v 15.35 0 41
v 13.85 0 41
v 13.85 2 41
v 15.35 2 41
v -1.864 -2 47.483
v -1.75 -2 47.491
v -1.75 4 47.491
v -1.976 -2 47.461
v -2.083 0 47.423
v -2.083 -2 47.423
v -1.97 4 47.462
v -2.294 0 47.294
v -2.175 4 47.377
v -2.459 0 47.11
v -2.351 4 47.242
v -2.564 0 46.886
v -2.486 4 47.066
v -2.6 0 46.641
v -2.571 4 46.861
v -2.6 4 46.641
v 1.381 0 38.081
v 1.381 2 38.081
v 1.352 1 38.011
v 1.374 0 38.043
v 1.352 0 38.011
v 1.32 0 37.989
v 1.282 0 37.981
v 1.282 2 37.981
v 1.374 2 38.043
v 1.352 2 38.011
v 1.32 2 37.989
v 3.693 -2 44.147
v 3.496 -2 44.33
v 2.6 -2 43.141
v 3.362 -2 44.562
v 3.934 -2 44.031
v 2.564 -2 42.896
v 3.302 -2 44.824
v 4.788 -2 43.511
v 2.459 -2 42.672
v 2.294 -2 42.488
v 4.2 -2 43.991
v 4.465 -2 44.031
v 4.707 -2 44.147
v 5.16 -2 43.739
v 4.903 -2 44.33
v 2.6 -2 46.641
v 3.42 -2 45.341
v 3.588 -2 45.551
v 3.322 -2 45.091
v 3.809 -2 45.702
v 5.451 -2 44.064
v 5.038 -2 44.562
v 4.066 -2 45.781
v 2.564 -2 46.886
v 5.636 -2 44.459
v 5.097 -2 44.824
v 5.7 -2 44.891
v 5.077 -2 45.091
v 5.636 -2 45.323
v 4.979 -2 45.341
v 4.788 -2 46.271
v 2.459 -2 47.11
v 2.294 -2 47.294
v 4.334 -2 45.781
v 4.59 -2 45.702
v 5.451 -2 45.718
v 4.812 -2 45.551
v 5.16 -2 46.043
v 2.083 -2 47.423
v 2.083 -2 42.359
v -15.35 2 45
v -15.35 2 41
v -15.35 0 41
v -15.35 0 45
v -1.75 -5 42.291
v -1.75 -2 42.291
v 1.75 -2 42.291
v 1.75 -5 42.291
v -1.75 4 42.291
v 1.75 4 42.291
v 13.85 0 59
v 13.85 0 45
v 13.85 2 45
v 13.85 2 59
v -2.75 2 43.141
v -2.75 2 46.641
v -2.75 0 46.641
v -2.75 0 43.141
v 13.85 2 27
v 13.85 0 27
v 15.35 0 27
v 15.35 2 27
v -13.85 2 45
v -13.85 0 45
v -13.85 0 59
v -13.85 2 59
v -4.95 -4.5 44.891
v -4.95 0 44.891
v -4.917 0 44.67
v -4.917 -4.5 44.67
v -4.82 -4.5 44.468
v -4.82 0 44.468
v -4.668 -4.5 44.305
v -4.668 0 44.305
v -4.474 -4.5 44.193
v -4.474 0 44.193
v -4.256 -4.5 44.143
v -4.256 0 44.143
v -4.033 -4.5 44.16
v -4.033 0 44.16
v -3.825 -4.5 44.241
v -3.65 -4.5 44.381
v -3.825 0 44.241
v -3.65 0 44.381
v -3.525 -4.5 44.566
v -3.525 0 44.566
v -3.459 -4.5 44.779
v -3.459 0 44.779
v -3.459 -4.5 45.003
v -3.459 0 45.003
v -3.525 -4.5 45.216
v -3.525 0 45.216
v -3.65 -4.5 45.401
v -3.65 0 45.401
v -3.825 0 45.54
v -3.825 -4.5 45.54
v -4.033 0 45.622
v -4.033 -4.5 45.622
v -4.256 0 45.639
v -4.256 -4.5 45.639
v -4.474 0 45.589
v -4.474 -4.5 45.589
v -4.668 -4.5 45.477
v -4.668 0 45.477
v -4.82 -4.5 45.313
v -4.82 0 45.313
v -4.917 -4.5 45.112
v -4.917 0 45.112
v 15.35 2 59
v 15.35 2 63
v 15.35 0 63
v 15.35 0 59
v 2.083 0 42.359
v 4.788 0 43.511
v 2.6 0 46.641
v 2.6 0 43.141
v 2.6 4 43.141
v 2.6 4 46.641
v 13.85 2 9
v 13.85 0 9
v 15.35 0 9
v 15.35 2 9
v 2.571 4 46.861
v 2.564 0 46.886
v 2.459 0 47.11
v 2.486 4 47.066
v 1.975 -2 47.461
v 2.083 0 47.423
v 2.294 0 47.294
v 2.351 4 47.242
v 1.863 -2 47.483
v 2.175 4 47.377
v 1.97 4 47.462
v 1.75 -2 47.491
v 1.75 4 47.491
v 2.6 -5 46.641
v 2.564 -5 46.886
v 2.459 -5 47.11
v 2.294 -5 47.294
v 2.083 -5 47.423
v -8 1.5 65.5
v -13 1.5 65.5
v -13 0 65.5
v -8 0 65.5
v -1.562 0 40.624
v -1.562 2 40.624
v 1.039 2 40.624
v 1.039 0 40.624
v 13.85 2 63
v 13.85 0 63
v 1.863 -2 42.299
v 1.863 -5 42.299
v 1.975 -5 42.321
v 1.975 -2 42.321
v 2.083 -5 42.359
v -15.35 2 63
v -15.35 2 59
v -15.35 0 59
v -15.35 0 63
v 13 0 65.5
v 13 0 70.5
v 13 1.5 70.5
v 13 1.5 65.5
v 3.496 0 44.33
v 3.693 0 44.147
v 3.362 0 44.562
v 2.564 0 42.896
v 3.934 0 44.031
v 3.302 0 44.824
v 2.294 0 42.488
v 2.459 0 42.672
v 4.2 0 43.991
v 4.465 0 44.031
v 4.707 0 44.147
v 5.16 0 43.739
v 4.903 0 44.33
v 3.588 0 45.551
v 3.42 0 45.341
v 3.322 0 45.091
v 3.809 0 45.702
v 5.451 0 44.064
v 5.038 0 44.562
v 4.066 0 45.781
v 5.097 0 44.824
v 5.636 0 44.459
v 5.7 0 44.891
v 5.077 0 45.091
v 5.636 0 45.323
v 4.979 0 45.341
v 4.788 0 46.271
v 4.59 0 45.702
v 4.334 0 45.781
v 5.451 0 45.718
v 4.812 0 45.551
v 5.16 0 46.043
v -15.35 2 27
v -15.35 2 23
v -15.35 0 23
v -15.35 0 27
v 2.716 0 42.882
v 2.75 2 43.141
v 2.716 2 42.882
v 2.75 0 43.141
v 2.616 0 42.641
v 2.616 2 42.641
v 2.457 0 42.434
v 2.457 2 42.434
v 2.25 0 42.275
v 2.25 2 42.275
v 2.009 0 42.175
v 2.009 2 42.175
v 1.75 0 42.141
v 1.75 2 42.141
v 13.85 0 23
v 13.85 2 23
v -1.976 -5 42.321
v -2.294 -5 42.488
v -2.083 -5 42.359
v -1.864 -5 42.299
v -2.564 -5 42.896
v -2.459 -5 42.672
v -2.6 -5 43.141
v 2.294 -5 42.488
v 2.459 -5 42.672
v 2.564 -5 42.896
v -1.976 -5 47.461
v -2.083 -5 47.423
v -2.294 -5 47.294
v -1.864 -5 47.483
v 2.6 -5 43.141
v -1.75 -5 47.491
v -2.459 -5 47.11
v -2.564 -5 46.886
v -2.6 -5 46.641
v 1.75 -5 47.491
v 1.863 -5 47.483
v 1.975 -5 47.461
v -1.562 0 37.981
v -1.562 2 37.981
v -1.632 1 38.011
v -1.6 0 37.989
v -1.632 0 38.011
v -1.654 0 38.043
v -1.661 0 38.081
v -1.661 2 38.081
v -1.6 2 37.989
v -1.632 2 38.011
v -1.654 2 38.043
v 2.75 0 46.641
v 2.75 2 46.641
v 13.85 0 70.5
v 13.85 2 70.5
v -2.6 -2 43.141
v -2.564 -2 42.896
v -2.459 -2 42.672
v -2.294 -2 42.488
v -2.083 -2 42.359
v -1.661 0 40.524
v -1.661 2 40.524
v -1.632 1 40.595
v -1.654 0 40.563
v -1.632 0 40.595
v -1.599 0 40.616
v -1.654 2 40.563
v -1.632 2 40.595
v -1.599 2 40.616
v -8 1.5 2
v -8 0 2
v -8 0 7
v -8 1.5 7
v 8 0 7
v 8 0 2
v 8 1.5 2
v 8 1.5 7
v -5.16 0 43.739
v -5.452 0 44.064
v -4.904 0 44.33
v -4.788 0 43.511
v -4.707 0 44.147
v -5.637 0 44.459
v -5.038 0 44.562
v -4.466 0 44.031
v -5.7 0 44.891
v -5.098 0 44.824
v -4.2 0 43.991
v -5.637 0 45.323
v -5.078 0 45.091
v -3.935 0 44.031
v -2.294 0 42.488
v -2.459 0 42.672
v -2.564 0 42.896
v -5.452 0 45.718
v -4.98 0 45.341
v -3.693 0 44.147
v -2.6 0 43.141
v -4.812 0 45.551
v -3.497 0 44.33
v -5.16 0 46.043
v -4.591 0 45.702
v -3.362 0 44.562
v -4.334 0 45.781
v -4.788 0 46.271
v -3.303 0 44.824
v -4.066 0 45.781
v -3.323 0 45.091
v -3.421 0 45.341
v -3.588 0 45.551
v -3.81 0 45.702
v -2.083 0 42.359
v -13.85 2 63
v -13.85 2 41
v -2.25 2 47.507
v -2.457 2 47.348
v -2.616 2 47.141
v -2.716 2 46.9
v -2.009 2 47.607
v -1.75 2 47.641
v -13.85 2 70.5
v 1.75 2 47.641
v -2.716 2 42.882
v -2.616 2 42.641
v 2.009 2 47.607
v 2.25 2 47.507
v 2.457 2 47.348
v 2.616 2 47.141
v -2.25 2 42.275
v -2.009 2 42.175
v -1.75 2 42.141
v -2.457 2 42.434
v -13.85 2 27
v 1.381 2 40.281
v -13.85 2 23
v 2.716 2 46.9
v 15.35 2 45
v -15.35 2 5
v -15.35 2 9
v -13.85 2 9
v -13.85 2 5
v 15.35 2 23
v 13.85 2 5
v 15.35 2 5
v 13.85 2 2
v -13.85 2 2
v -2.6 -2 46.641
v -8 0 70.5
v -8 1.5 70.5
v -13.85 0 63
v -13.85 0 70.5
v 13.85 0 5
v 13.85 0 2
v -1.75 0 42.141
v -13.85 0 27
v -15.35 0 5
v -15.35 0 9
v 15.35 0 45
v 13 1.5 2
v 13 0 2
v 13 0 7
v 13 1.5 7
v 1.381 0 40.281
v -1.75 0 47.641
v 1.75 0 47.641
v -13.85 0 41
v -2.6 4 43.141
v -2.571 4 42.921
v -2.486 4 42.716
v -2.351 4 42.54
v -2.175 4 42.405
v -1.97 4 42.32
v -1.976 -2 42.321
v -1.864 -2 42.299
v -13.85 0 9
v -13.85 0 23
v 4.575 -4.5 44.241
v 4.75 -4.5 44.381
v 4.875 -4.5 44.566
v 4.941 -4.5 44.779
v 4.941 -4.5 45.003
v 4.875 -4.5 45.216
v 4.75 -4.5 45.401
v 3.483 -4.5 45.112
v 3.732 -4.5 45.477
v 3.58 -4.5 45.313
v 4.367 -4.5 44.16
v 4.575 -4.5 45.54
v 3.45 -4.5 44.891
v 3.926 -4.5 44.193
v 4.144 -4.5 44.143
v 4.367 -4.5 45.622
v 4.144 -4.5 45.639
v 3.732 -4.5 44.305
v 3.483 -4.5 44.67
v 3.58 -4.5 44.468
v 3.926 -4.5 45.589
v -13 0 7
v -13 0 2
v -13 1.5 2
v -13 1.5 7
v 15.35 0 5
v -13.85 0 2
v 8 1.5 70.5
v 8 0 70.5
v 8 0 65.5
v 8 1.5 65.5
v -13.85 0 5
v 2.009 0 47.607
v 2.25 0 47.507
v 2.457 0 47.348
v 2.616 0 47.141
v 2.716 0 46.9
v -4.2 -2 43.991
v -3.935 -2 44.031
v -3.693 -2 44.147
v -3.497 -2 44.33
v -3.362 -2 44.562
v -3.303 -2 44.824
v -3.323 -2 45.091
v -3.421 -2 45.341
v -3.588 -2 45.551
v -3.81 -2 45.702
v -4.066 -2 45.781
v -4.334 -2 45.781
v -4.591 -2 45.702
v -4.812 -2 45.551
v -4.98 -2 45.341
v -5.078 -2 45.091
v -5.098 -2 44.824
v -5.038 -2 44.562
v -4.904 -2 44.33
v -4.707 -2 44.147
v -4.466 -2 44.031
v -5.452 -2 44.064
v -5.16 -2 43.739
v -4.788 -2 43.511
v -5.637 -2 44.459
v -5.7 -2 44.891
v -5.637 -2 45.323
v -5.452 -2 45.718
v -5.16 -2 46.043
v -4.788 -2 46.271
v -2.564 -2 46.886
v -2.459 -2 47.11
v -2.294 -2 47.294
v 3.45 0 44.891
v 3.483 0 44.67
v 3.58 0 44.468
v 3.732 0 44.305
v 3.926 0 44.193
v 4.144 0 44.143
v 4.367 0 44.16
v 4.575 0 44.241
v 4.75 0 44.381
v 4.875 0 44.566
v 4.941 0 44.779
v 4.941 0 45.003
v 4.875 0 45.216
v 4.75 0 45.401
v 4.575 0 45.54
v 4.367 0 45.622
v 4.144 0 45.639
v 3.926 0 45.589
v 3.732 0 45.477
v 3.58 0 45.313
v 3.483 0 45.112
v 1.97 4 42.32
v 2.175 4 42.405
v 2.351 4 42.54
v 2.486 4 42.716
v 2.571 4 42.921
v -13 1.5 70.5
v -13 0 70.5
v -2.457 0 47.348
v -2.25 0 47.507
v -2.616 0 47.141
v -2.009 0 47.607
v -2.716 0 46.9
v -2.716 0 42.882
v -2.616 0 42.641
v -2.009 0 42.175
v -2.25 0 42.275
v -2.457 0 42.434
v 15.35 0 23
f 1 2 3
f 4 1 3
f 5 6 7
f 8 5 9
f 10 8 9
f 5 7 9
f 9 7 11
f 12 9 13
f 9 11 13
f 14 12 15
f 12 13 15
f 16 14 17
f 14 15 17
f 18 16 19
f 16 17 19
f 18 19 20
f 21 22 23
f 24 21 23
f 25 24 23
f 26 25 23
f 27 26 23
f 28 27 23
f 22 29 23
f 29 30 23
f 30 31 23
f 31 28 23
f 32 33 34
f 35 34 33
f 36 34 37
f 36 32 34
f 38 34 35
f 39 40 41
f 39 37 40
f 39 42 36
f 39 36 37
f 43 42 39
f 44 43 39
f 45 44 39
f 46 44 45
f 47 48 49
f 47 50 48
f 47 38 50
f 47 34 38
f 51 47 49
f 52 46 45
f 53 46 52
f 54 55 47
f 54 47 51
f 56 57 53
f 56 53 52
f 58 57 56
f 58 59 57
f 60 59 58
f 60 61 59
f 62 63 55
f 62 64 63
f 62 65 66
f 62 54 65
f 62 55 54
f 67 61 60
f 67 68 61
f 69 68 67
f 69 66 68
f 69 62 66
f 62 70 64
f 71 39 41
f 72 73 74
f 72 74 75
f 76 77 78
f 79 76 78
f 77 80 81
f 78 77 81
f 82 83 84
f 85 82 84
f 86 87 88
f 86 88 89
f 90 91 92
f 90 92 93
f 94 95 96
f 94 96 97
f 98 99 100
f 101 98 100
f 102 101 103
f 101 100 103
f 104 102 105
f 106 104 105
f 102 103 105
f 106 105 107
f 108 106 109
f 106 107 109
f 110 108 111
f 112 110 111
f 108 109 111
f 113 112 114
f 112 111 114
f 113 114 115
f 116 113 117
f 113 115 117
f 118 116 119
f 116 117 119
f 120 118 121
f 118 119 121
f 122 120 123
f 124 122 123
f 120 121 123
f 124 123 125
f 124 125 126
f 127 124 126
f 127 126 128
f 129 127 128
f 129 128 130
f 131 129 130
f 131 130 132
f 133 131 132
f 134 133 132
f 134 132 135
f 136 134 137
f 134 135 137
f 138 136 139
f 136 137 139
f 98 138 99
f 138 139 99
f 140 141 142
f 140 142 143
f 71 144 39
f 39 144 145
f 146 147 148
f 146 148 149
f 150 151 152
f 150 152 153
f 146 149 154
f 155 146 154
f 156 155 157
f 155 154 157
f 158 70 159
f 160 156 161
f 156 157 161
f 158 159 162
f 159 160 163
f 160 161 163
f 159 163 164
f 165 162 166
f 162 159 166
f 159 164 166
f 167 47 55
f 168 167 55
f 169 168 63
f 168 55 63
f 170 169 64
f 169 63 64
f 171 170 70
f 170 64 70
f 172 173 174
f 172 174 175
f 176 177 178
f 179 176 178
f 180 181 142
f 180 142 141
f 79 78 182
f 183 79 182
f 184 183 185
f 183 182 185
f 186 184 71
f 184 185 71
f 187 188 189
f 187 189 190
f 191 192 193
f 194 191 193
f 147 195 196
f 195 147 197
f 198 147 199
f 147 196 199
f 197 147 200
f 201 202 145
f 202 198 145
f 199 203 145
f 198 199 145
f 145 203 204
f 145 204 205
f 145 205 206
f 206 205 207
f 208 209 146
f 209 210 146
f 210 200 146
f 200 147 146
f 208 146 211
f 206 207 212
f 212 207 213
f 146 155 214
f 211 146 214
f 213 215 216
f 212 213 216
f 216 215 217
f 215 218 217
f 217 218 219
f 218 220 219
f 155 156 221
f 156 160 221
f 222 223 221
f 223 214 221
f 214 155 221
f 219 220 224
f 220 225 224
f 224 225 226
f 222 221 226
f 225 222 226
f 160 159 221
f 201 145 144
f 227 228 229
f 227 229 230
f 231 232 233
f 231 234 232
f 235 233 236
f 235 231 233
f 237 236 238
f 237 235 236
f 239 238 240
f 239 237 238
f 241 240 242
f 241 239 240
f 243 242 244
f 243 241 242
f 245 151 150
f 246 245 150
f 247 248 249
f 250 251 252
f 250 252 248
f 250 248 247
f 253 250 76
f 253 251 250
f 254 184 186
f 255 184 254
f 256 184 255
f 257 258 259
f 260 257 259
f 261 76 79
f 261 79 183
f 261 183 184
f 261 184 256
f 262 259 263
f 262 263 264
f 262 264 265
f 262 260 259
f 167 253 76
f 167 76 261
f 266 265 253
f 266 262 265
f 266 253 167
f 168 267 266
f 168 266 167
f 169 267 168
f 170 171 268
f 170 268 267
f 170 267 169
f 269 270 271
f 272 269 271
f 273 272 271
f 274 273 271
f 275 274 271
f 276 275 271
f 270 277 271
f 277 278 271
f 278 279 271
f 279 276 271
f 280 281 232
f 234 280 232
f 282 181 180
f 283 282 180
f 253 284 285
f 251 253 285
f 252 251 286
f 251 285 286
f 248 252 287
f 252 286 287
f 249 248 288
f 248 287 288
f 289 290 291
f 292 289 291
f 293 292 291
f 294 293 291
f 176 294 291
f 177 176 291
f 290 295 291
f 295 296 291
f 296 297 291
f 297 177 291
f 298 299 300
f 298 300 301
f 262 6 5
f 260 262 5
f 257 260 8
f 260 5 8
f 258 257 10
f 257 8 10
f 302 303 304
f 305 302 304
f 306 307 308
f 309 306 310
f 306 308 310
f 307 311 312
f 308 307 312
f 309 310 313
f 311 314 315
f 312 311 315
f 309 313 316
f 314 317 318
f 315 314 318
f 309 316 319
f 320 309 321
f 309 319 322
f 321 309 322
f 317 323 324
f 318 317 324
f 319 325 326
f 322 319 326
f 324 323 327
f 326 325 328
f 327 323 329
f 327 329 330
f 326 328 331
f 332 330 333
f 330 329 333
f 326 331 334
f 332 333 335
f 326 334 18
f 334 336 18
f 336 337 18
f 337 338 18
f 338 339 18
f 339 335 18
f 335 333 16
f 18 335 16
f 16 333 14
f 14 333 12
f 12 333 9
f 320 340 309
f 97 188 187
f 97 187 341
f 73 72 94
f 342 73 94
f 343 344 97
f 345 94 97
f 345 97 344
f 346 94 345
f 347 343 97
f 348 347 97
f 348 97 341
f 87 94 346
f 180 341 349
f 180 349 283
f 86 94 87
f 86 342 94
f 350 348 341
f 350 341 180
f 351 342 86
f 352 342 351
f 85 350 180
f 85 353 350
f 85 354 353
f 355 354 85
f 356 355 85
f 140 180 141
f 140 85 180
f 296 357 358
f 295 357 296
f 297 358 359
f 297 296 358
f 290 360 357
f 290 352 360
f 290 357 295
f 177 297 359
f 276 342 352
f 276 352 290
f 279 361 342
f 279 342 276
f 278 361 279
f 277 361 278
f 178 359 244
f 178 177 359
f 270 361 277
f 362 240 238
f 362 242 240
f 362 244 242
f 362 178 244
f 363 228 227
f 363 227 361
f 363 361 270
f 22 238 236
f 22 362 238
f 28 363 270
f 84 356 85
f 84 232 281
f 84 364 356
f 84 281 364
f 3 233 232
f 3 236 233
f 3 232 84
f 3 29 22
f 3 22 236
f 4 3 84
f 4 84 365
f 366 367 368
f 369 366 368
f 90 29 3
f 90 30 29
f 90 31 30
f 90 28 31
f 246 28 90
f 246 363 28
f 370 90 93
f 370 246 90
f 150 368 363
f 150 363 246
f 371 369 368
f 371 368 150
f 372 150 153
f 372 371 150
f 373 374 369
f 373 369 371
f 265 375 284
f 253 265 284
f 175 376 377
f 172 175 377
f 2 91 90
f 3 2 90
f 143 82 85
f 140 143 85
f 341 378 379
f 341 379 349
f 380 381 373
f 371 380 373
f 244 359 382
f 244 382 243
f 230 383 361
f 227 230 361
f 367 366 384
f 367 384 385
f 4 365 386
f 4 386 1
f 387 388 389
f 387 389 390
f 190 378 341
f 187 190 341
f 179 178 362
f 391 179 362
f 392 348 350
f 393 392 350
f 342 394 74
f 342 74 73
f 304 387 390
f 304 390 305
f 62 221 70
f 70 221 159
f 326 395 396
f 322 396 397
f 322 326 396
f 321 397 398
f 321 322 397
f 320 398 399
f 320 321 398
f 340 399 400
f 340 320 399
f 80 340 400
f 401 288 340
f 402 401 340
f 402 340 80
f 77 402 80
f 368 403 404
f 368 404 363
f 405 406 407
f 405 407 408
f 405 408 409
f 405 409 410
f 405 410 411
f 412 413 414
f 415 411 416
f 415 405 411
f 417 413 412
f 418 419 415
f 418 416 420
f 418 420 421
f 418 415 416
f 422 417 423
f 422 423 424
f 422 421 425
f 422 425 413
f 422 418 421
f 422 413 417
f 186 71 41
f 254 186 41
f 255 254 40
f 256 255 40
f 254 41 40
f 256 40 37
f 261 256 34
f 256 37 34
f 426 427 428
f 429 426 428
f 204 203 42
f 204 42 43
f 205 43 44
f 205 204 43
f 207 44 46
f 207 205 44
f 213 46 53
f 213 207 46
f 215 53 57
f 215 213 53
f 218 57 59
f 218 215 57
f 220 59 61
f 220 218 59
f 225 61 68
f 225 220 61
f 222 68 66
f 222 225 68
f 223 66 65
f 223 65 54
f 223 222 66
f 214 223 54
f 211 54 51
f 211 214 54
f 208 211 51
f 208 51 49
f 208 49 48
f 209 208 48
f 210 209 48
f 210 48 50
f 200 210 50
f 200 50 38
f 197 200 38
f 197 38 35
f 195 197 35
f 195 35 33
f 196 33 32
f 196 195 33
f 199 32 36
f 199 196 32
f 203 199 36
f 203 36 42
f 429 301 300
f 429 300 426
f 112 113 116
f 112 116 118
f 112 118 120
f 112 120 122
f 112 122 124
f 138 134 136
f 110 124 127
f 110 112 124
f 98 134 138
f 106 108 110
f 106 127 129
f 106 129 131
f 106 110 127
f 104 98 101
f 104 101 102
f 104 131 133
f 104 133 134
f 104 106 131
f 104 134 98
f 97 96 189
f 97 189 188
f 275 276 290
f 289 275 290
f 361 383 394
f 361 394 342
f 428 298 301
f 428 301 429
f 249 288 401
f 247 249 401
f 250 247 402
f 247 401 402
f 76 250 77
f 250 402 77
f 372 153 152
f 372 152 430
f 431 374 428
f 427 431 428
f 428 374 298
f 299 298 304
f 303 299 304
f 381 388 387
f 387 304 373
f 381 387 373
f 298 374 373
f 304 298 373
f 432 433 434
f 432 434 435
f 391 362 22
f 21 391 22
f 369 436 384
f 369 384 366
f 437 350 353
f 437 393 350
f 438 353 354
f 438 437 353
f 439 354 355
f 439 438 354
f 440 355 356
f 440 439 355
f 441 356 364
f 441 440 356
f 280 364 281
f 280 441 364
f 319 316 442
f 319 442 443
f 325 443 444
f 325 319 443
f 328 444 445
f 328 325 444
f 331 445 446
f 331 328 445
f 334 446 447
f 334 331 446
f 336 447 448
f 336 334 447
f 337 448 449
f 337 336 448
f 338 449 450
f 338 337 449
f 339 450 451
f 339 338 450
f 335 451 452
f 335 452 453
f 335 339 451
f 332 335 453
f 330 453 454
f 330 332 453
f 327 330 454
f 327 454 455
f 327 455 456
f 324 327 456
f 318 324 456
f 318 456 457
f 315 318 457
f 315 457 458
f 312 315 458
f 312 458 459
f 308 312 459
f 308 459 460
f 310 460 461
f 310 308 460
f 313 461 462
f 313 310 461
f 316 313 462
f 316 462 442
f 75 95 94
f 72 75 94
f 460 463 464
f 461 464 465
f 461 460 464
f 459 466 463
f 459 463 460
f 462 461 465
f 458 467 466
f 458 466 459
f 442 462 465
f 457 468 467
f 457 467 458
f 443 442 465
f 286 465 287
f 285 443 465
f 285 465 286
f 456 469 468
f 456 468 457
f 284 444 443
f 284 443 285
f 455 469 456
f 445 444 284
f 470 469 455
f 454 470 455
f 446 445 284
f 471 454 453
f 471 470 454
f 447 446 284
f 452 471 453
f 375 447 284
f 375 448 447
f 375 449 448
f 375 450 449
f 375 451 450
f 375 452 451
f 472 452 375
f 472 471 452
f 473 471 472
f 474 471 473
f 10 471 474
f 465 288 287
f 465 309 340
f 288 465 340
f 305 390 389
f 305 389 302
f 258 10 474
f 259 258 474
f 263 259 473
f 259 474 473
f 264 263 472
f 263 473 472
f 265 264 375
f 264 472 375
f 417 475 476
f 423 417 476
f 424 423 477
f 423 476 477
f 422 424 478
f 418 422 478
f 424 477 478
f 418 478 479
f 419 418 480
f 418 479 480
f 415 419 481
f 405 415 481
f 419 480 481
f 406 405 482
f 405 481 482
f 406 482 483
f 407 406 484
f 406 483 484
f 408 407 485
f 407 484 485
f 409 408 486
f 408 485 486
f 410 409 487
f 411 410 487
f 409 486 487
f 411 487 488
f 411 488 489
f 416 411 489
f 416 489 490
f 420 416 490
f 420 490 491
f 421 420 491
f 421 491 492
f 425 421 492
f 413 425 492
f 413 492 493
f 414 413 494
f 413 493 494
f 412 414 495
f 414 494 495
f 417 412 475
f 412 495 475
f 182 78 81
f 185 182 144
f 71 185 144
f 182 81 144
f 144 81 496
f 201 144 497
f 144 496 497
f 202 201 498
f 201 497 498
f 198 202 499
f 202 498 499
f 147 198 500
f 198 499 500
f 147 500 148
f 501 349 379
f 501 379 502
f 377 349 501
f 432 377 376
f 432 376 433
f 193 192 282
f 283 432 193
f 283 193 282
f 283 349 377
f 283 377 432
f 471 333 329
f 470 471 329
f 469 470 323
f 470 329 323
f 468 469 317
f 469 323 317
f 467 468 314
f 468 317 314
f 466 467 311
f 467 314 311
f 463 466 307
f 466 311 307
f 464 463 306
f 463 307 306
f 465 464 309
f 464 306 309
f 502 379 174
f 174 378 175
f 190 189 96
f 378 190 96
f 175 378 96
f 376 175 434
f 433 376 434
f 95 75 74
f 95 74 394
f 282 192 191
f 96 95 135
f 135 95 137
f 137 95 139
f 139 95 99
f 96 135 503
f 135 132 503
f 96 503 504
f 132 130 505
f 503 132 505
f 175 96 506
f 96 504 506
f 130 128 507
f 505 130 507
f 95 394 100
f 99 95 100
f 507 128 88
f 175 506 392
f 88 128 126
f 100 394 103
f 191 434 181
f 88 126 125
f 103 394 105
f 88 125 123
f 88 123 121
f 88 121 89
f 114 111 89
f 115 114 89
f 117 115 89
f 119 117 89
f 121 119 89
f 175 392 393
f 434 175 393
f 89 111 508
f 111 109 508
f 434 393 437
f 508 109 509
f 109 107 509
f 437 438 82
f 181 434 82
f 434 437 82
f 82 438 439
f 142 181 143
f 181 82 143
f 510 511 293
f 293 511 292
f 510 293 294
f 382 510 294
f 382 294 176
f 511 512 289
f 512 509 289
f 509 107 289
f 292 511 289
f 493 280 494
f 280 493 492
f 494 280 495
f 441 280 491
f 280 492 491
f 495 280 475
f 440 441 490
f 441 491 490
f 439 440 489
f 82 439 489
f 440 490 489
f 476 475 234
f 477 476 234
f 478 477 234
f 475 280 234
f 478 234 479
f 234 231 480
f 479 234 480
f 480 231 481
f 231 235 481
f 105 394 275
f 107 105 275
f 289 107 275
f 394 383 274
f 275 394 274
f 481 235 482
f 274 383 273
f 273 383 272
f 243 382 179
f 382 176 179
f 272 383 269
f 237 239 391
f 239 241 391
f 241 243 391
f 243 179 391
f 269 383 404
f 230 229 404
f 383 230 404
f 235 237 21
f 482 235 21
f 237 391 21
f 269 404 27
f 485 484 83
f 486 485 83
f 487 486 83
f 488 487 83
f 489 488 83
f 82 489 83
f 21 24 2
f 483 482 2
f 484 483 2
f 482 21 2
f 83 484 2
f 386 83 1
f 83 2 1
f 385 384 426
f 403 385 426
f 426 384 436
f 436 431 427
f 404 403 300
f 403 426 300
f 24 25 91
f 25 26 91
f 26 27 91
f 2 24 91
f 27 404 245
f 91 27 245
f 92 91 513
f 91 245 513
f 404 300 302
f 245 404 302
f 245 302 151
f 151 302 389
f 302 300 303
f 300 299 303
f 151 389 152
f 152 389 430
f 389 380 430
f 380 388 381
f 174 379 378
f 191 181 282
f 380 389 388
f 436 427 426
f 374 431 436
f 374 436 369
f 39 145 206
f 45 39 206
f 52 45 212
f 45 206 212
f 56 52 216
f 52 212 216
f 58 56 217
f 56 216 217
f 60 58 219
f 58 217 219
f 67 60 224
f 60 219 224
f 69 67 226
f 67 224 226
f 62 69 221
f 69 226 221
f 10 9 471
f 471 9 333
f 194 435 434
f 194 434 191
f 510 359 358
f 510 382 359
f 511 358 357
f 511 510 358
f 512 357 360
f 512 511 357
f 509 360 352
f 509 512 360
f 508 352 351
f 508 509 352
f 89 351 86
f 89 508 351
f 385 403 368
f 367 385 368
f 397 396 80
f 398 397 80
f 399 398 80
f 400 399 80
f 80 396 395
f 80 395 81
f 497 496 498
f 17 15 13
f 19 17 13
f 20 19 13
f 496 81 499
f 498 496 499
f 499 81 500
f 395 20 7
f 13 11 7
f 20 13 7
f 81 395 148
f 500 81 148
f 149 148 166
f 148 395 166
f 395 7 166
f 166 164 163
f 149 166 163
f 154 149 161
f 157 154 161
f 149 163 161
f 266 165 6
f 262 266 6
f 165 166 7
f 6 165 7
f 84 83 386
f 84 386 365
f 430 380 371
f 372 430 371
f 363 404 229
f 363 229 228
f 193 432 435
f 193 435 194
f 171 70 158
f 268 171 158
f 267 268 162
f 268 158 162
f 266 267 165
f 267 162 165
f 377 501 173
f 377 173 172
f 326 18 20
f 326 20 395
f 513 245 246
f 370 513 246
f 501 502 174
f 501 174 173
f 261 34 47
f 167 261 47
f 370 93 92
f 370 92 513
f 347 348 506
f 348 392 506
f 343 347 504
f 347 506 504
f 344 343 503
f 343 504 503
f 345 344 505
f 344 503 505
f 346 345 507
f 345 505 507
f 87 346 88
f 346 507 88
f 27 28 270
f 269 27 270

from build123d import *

# Parameters (mm, degrees)
SKETCH_1_W          = 27.7
SKETCH_1_H          = 2
EXTRUDE_1_DEPTH     = 70.5
SKETCH_16_W         = 5
SKETCH_16_H         = 1.5
CUT_EXTRUDE_6_DEPTH = 5
SKETCH_4_W          = 5.5
SKETCH_4_H          = 5.5
CUT_EXTRUDE_2_DEPTH = 72.875395651
FILLET_1_R          = 1
EXTRUDE_3_DEPTH     = 4
SKETCH_6_R          = 0.9
EXTRUDE_4_DEPTH     = 2
SKETCH_7_R          = 0.75
EXTRUDE_5_DEPTH     = 4.5
EXTRUDE_START       = 2
EXTRUDE_6_DEPTH     = 3
CUT_EXTRUDE_7_DEPTH = 2
SKETCH_18_W         = 27.7
SKETCH_18_H         = 2
CUT_EXTRUDE_8_DEPTH = 73.187758774
SKETCH_19_W         = 4
SKETCH_19_H         = 2
EXTRUDE_7_DEPTH     = 1.5
SKETCH_20_W         = 4
SKETCH_20_H         = 2
EXTRUDE_9_DEPTH     = 1.5
SKETCH_21_W         = 5
SKETCH_21_H         = 1.5
CUT_EXTRUDE_9_DEPTH = 5


with BuildPart() as part:
    # 草图1 → 凸台-拉伸1 (new body)
    with BuildSketch(Plane.XY):
        with Locations((0, 1)):
            Rectangle(SKETCH_1_W, SKETCH_1_H)
    extrude(amount=EXTRUDE_1_DEPTH)

    # 草图16 → 切除-拉伸6 (cut)
    with BuildSketch(Plane.XY.offset(70.5)):
        with Locations((-10.5, 0.75)):
            Rectangle(SKETCH_16_W, SKETCH_16_H)
        with Locations((10.5, 0.75)):
            Rectangle(SKETCH_16_W, SKETCH_16_H)
    extrude(amount=-CUT_EXTRUDE_6_DEPTH, mode=Mode.SUBTRACT)

    # 草图4 → 切除-拉伸2 (cut, through all)
    with BuildSketch(Plane(origin=(0, 2, 0), x_dir=(1, 0, 0), z_dir=(0, 1, 0))):
        with Locations((-0.000254001, -44.890957582)):
            Rectangle(SKETCH_4_W, SKETCH_4_H)
    extrude(amount=-CUT_EXTRUDE_2_DEPTH, mode=Mode.SUBTRACT)

    # 圆角1
    fillet_1_edges = [part.edges().sort_by_distance(p)[0] for p in [
        (2.749745999, 1, 42.140957582),
        (2.749745999, 1, 47.640957582),
        (-2.750254001, 1, 47.640957582),
        (-2.750254001, 1, 42.140957582),
    ]]
    fillet(fillet_1_edges, radius=FILLET_1_R)

    # 草图7 → 凸台-拉伸5 (add)
    with BuildSketch(Plane.XZ):
        with Locations(Location((4.199745999, 44.890957582, 0), (0, 0, 180))):
            Circle(SKETCH_7_R)
        with Locations(Location((-4.200254001, 44.890957582, 0), (0, 0, 180))):
            Circle(SKETCH_7_R)
    extrude(amount=EXTRUDE_5_DEPTH)

    # 草图17 → 切除-拉伸7 (cut)
    with BuildSketch(Plane(origin=(0, 2, 0), x_dir=(1, 0, 0), z_dir=(0, 1, 0))):
        with BuildLine():
            Line((1.381293223, -40.281381402), (1.381293223, -38.081000872))
            add(Edge.make_bspline(
                [(1.381293223, -38.081000872), (1.381293223, -37.981381402), (1.281673753, -37.981381402)],
                knots=[5.501585242, 5.501585242, 5.501585242, 7.064785372, 7.064785372, 7.064785372], degree=2, weights=[1, 0.709787336, 1]))
            Line((1.281673753, -37.981381402), (-1.561607713, -37.981381402))
            add(Edge.make_bspline(
                [(-1.561607713, -37.981381402), (-1.661227183, -37.981381402), (-1.661227183, -38.081000872)],
                knots=[5.501585242, 5.501585242, 5.501585242, 7.064785372, 7.064785372, 7.064785372], degree=2, weights=[1, 0.709787336, 1]))
            Line((-1.661227183, -38.081000872), (-1.661227183, -40.524282338))
            add(Edge.make_bspline(
                [(-1.661227183, -40.524282338), (-1.661227183, -40.623901808), (-1.561607713, -40.623901808)],
                knots=[5.501585242, 5.501585242, 5.501585242, 7.064785372, 7.064785372, 7.064785372], degree=2, weights=[1, 0.709787336, 1]))
            Line((-1.561607713, -40.623901808), (1.038772817, -40.623901808))
            Line((1.038772817, -40.623901808), (1.381293223, -40.281381402))
        make_face()
    extrude(amount=-CUT_EXTRUDE_7_DEPTH, mode=Mode.SUBTRACT)

    # 草图18 → 切除-拉伸8 (cut, through all)
    with BuildSketch(Plane(origin=(0, 2, 0), x_dir=(1, 0, 0), z_dir=(0, 1, 0))):
        with Locations((0, -1)):
            Rectangle(SKETCH_18_W, SKETCH_18_H)
    extrude(amount=-CUT_EXTRUDE_8_DEPTH, mode=Mode.SUBTRACT)

    # 草图19 → 凸台-拉伸7 (add)
    with BuildSketch(Plane.ZY.offset(13.85)):
        with Locations((7, 1)):
            Rectangle(SKETCH_19_W, SKETCH_19_H)
        with Locations((43, 1)):
            Rectangle(SKETCH_19_W, SKETCH_19_H)
        with Locations((25, 1)):
            Rectangle(SKETCH_19_W, SKETCH_19_H)
        with Locations((61, 1)):
            Rectangle(SKETCH_19_W, SKETCH_19_H)
    extrude(amount=EXTRUDE_7_DEPTH)

    # 草图20 → 凸台-拉伸9 (add)
    with BuildSketch(Plane(origin=(13.85, 0, 0), x_dir=(0, 0, -1), z_dir=(1, 0, 0))):
        with Locations((-61, 1)):
            Rectangle(SKETCH_20_W, SKETCH_20_H)
        with Locations((-43, 1)):
            Rectangle(SKETCH_20_W, SKETCH_20_H)
        with Locations((-25, 1)):
            Rectangle(SKETCH_20_W, SKETCH_20_H)
        with Locations((-7, 1)):
            Rectangle(SKETCH_20_W, SKETCH_20_H)
    extrude(amount=EXTRUDE_9_DEPTH)

    # 草图21 → 切除-拉伸9 (cut)
    with BuildSketch(Plane(origin=(0, 0, 2), x_dir=(-1, 0, 0), z_dir=(0, 0, -1))):
        with Locations((-10.5, 0.75)):
            Rectangle(SKETCH_21_W, SKETCH_21_H)
        with Locations((10.5, 0.75)):
            Rectangle(SKETCH_21_W, SKETCH_21_H)
    extrude(amount=-CUT_EXTRUDE_9_DEPTH, mode=Mode.SUBTRACT)


with BuildPart() as body_2:
    # 草图5 → 凸台-拉伸3 (new body)
    with BuildSketch(Plane.XZ):
        with BuildLine():
            Line((-2.600254001, 46.640957582), (-2.600254001, 43.140957582))
            ThreePointArc((-2.600254001, 43.140957582), (-2.351294765, 42.539916818), (-1.750254001, 42.290957582))
            Line((-1.750254001, 42.290957582), (1.749745999, 42.290957582))
            ThreePointArc((1.749745999, 42.290957582), (2.350786764, 42.539916818), (2.599745999, 43.140957582))
            Line((2.599745999, 43.140957582), (2.599745999, 46.640957582))
            ThreePointArc((2.599745999, 46.640957582), (2.350786764, 47.241998346), (1.749745999, 47.490957582))
            Line((1.749745999, 47.490957582), (-1.750254001, 47.490957582))
            ThreePointArc((-1.750254001, 47.490957582), (-2.351294765, 47.241998346), (-2.600254001, 46.640957582))
        make_face()
    extrude(amount=-EXTRUDE_3_DEPTH)

    # 草图6 → 凸台-拉伸4 (add)
    # profile 1 of 3: a face of its own
    with BuildSketch(Plane.XZ):
        with BuildLine():
            ThreePointArc((-2.600254001, 46.640957582), (-2.459343486, 47.109670821), (-2.08333141, 47.422980241))
            Line((-2.08333141, 47.422980241), (-4.788037664, 46.270997568))
            ThreePointArc((-4.788037664, 46.270997568), (-5.700254001, 44.890957582), (-4.788037664, 43.510917595))
            Line((-4.788037664, 43.510917595), (-2.08333141, 42.358934923))
            ThreePointArc((-2.08333141, 42.358934923), (-2.459343486, 42.672244342), (-2.600254001, 43.140957582))
            Line((-2.600254001, 43.140957582), (-2.600254001, 46.640957582))
        make_face()
        with Locations(Location((-4.200254001, 44.890957582, 0), (0, 0, 270))):
            Circle(SKETCH_6_R, mode=Mode.SUBTRACT)
    # profile 2 of 3: a face of its own
    with BuildSketch(Plane.XZ):
        with BuildLine():
            Line((1.749745999, 47.490957582), (-1.750254001, 47.490957582))
            ThreePointArc((-1.750254001, 47.490957582), (-2.351294765, 47.241998346), (-2.600254001, 46.640957582))
            Line((-2.600254001, 46.640957582), (-2.600254001, 43.140957582))
            ThreePointArc((-2.600254001, 43.140957582), (-2.351294765, 42.539916818), (-1.750254001, 42.290957582))
            Line((-1.750254001, 42.290957582), (1.749745999, 42.290957582))
            ThreePointArc((1.749745999, 42.290957582), (2.350786764, 42.539916818), (2.599745999, 43.140957582))
            Line((2.599745999, 43.140957582), (2.599745999, 46.640957582))
            ThreePointArc((2.599745999, 46.640957582), (2.350786764, 47.241998346), (1.749745999, 47.490957582))
        make_face()
    # profile 3 of 3: a face of its own
    with BuildSketch(Plane.XZ):
        with BuildLine():
            Line((4.787529663, 46.270997568), (2.082823409, 47.422980241))
            ThreePointArc((2.082823409, 47.422980241), (2.458835485, 47.109670821), (2.599745999, 46.640957582))
            Line((2.599745999, 46.640957582), (2.599745999, 43.140957582))
            ThreePointArc((2.599745999, 43.140957582), (2.458835485, 42.672244342), (2.082823409, 42.358934923))
            Line((2.082823409, 42.358934923), (4.787529663, 43.510917595))
            ThreePointArc((4.787529663, 43.510917595), (5.699745999, 44.890957582), (4.787529663, 46.270997568))
        make_face()
        with Locations(Location((4.199745999, 44.890957582, 0), (0, 0, 270))):
            Circle(SKETCH_6_R, mode=Mode.SUBTRACT)
    extrude(amount=EXTRUDE_4_DEPTH)

    # 草图6<3> → 凸台-拉伸6 (add)
    with BuildSketch(Plane.XZ.offset(EXTRUDE_START)):
        with BuildLine():
            ThreePointArc((-1.750254001, 47.490957582), (-1.920225674, 47.473789876), (-2.08333141, 47.422980241))
            ThreePointArc((-2.08333141, 47.422980241), (-2.459343486, 47.109670821), (-2.600254001, 46.640957582))
            Line((-2.600254001, 46.640957582), (-2.600254001, 43.140957582))
            ThreePointArc((-2.600254001, 43.140957582), (-2.459343486, 42.672244342), (-2.08333141, 42.358934923))
            ThreePointArc((-2.08333141, 42.358934923), (-1.920225674, 42.308125288), (-1.750254001, 42.290957582))
            Line((-1.750254001, 42.290957582), (1.749745999, 42.290957582))
            ThreePointArc((1.749745999, 42.290957582), (1.919717673, 42.308125288), (2.082823409, 42.358934923))
            ThreePointArc((2.082823409, 42.358934923), (2.458835485, 42.672244342), (2.599745999, 43.140957582))
            Line((2.599745999, 43.140957582), (2.599745999, 46.640957582))
            ThreePointArc((2.599745999, 46.640957582), (2.458835485, 47.109670821), (2.082823409, 47.422980241))
            ThreePointArc((2.082823409, 47.422980241), (1.919717673, 47.473789876), (1.749745999, 47.490957582))
            Line((1.749745999, 47.490957582), (-1.750254001, 47.490957582))
        make_face()
    extrude(amount=EXTRUDE_6_DEPTH)


solid = Compound([part.part, body_2.part])
